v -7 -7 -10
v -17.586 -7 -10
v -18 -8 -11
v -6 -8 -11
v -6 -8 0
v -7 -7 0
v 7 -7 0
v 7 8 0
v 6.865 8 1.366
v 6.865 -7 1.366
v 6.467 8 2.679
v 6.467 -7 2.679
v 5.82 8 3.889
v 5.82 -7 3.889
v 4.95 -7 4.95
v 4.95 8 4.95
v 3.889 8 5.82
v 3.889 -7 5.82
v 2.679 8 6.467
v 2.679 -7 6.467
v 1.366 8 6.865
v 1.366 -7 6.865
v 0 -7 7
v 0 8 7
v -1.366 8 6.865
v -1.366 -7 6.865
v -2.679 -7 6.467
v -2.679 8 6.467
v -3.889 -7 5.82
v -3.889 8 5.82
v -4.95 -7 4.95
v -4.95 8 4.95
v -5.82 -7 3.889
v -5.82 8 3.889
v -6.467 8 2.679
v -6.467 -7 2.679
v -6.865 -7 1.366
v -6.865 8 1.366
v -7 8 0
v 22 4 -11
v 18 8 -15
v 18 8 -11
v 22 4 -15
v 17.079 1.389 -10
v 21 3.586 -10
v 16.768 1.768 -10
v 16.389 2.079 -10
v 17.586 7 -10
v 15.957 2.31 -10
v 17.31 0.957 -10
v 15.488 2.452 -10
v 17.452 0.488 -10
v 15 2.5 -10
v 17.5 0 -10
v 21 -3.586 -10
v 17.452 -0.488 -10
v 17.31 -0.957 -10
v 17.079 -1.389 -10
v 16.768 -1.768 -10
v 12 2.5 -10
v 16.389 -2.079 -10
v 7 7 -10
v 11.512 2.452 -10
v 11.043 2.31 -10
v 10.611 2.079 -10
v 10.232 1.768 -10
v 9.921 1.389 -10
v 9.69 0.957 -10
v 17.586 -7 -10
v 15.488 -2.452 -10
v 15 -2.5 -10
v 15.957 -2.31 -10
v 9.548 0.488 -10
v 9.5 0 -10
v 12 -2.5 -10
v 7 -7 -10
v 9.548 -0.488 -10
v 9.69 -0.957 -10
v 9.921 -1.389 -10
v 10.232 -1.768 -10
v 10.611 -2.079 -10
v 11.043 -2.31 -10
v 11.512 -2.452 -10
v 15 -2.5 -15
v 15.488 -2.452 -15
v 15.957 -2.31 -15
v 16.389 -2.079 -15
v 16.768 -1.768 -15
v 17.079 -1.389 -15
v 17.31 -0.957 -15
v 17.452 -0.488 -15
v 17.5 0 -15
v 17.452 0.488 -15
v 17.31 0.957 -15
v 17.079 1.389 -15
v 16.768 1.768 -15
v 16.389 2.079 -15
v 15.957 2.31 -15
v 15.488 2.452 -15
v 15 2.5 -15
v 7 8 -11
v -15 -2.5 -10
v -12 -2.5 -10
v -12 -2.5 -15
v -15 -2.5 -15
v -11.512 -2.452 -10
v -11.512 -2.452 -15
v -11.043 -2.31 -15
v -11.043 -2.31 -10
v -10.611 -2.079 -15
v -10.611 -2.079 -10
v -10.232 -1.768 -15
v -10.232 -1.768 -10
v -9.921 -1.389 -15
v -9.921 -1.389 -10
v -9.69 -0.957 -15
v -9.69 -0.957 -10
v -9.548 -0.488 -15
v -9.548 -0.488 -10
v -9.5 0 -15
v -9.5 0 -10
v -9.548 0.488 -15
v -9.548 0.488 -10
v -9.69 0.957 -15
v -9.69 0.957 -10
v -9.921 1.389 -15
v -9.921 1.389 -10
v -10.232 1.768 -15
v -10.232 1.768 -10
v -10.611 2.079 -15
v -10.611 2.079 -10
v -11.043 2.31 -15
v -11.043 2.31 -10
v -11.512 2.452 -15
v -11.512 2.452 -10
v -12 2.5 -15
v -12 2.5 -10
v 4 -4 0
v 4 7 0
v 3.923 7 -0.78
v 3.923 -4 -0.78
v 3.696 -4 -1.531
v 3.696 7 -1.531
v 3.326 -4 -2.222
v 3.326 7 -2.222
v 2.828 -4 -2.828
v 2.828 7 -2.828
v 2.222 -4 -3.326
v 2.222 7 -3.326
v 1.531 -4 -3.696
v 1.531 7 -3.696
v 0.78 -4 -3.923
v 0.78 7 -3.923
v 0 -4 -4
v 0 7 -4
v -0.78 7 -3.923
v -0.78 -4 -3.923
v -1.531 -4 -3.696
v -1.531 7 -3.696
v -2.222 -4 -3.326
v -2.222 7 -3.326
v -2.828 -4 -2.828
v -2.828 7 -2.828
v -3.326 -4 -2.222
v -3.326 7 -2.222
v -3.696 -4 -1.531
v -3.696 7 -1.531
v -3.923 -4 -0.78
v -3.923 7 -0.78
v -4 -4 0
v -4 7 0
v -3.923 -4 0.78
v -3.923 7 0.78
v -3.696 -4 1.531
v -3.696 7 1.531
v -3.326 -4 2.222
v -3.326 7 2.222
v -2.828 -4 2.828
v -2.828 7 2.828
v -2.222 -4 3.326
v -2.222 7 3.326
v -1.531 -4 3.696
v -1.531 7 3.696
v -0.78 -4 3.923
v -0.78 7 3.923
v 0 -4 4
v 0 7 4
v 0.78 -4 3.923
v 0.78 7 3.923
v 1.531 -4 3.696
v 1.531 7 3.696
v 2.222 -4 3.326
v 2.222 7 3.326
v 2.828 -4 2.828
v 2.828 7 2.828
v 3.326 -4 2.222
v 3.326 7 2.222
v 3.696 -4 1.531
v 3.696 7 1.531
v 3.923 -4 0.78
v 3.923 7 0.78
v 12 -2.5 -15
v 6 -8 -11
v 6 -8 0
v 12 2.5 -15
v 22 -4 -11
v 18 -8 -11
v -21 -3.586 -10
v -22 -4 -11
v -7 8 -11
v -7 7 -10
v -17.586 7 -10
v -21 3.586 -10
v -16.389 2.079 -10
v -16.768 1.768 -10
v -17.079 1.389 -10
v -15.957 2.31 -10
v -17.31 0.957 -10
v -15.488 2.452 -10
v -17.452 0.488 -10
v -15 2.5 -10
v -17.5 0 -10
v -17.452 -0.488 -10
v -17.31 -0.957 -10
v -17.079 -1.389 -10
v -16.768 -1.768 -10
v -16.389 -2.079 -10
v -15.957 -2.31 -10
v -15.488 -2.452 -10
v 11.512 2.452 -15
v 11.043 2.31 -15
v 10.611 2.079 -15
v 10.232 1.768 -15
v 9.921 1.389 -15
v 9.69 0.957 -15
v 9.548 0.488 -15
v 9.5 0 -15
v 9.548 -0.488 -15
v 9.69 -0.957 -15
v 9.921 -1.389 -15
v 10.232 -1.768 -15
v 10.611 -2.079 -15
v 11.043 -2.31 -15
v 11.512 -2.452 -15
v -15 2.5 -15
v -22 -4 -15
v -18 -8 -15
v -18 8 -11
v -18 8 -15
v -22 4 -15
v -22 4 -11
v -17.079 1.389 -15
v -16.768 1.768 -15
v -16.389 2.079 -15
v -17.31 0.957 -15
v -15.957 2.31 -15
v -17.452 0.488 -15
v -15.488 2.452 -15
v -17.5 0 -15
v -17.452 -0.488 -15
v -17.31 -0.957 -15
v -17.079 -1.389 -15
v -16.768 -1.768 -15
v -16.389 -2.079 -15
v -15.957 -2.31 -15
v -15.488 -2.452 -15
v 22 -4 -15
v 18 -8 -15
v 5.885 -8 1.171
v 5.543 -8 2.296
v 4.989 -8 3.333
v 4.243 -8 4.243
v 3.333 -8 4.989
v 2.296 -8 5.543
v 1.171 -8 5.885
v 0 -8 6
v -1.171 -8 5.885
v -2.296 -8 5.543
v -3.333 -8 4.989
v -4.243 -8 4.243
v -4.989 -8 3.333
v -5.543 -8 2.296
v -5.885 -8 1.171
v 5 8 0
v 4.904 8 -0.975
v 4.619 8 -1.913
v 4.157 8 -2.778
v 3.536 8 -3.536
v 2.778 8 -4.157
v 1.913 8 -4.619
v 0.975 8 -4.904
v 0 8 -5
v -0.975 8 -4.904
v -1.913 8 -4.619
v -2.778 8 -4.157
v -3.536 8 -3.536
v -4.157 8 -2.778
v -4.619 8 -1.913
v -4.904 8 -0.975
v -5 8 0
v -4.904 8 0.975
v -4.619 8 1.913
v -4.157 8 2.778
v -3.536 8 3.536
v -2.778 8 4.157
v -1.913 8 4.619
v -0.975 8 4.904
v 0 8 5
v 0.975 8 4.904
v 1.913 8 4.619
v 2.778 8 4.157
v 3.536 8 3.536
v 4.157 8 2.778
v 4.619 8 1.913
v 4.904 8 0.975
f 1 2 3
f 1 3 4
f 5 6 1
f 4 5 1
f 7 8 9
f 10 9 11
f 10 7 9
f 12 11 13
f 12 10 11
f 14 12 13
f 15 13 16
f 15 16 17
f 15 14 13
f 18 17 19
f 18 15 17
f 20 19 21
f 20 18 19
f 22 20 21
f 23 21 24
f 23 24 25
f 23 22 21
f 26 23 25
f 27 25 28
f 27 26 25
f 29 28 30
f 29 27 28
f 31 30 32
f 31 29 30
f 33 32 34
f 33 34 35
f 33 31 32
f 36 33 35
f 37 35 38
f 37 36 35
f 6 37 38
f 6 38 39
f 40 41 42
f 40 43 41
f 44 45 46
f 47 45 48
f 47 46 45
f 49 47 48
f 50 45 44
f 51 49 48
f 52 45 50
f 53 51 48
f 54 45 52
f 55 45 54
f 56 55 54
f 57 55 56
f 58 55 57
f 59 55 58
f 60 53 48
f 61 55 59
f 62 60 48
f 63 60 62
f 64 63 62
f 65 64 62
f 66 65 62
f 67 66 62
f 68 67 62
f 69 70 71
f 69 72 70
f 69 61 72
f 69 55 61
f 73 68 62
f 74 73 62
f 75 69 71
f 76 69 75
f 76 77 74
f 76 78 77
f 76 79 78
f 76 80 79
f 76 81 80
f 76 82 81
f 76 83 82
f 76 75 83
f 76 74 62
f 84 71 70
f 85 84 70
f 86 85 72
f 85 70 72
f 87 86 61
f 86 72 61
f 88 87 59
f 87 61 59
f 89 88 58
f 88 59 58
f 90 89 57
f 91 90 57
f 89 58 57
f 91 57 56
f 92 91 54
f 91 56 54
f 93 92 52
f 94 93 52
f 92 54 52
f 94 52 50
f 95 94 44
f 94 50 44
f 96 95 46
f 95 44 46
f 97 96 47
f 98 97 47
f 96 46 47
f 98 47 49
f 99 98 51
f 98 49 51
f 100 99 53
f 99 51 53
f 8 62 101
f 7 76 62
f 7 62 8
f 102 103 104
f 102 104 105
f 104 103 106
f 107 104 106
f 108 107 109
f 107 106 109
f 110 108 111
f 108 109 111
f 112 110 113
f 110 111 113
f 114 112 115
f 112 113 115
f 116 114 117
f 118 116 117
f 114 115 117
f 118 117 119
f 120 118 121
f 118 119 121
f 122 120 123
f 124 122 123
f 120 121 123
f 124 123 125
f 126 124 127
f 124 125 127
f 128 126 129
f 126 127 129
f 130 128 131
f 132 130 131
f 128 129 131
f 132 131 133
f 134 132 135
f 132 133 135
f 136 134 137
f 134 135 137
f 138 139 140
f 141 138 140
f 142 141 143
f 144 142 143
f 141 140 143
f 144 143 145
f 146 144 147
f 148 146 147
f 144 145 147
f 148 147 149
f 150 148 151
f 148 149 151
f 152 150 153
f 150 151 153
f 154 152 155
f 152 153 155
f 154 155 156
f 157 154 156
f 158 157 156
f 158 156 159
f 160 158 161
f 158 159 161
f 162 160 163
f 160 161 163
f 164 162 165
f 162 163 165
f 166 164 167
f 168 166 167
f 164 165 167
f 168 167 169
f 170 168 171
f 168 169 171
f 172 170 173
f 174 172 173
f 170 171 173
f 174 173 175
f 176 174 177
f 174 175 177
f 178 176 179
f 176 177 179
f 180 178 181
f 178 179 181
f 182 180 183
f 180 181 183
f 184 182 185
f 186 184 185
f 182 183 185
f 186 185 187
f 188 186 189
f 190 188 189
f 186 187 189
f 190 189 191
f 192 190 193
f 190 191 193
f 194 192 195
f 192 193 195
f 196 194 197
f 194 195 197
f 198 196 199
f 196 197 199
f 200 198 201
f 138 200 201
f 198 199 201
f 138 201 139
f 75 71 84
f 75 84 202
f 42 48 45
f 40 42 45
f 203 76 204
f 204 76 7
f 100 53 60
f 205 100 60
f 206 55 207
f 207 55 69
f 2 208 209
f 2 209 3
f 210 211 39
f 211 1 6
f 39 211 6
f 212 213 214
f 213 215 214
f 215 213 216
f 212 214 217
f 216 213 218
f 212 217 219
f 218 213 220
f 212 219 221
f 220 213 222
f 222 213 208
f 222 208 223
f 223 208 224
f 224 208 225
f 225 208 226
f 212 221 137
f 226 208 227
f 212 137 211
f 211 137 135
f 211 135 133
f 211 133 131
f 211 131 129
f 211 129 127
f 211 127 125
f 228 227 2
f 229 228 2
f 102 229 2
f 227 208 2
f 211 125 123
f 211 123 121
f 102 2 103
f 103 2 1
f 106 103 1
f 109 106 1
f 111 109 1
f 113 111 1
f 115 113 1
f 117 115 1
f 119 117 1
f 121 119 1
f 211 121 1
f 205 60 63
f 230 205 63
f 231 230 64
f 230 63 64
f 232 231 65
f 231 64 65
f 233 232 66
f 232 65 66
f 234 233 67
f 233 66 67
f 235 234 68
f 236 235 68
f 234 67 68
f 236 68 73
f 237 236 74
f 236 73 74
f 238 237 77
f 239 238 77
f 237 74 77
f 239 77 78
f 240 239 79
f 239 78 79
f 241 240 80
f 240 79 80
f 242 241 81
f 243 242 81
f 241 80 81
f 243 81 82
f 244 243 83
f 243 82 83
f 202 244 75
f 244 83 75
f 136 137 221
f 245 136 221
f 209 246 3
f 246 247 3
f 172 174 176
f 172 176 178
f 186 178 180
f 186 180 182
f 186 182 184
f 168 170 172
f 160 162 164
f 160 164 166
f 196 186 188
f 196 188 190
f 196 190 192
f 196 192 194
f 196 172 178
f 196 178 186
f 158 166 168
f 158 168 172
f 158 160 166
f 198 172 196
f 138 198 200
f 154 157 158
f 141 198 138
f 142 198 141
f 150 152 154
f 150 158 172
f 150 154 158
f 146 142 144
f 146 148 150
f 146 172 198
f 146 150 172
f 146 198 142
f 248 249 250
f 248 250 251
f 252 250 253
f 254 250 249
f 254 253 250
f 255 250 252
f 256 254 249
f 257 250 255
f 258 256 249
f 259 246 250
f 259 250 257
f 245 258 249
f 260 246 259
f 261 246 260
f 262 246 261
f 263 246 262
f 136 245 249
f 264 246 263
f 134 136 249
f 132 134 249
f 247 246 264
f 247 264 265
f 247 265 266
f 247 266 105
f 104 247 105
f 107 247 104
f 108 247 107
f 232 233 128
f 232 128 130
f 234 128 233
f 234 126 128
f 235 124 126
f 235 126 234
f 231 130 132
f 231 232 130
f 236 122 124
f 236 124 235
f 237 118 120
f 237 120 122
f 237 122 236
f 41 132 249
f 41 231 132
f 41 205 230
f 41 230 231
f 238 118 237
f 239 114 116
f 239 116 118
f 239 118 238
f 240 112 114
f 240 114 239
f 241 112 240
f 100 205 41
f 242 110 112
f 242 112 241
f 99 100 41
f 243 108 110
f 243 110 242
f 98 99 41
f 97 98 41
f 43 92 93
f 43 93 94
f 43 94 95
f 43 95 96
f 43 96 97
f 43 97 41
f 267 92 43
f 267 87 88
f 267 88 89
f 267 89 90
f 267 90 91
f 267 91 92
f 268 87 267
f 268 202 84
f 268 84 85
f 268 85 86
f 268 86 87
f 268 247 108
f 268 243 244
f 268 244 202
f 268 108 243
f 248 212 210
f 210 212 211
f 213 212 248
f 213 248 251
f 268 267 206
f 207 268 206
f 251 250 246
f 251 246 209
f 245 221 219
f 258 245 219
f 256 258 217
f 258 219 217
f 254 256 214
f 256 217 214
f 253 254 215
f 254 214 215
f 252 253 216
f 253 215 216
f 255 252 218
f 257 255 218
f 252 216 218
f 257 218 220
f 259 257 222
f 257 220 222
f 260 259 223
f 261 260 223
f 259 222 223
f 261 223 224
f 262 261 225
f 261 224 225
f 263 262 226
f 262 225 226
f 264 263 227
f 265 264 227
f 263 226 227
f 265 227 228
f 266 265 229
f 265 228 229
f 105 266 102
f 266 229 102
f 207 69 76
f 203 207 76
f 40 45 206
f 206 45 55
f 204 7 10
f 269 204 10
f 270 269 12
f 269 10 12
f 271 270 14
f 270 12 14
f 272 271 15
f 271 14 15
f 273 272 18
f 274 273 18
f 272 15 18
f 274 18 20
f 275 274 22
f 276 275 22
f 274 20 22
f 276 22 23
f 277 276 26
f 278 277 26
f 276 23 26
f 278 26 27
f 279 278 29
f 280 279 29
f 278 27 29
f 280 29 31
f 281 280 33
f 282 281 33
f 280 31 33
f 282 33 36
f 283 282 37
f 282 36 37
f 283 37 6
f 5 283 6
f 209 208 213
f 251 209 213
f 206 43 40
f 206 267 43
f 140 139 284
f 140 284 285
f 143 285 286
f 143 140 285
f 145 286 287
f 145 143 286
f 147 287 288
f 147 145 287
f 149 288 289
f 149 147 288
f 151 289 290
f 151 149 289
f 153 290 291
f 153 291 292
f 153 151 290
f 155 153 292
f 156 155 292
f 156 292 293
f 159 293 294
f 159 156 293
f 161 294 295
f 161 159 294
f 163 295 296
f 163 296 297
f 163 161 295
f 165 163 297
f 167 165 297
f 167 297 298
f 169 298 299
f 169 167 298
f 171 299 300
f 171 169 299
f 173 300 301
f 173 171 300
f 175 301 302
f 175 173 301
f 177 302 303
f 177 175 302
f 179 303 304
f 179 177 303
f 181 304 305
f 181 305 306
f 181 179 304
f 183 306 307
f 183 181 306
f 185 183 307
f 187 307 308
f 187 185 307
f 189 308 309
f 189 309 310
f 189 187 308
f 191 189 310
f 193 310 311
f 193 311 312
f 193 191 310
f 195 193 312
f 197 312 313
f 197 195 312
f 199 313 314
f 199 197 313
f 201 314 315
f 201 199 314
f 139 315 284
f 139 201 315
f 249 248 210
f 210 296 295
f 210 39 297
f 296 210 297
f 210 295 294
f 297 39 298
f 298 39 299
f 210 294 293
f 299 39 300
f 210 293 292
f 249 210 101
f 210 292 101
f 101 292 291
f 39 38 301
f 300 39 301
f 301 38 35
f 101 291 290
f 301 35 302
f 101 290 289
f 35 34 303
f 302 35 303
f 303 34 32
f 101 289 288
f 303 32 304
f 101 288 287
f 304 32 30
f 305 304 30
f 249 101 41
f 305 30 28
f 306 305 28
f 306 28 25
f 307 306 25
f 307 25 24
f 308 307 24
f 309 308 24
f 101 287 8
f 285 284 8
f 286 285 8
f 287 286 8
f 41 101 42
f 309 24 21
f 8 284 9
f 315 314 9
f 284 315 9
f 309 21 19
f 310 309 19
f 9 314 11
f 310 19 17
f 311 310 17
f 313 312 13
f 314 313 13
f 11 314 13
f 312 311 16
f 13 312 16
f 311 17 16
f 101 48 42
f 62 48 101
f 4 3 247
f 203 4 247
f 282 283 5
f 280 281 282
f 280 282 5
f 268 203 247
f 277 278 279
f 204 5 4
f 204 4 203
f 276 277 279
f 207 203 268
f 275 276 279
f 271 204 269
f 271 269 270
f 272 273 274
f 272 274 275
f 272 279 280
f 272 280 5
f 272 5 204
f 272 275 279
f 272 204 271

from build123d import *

# Parameters (mm, degrees)
PAD_DEPTH       = 8
POCKET_DEPTH    = 5.001
SKETCH002_R     = 4
POCKET001_DEPTH = 12
CHAMFER_SIZE    = 4
CHAMFER001_SIZE = 1
CHAMFER002_SIZE = 1


with BuildPart() as part:
    # Sketch → Pad (new body, symmetric)
    with BuildSketch(Plane.XZ):
        with BuildLine():
            Line((-22, -15), (22, -15))
            Line((22, -15), (22, -10))
            Line((22, -10), (7, -10))
            Line((7, -10), (7, 0))
            ThreePointArc((7, 0), (0, 7), (-7, 0))
            Line((-7, -10), (-7, 0))
            Line((-22, -10), (-7, -10))
            Line((-22, -15), (-22, -10))
        make_face()
    extrude(amount=PAD_DEPTH, both=True)

    # Sketch001 (on Face7 of Pad) → Pocket (cut, through all)
    with BuildSketch(Plane(origin=(0, 0, -10), x_dir=(-1, 0, 0), z_dir=(0, 0, 1))):
        with BuildLine():
            ThreePointArc((-15, 2.5), (-17.5, 0), (-15, -2.5))
            Line((-15, -2.5), (-12, -2.5))
            ThreePointArc((-12, -2.5), (-9.5, 0), (-12, 2.5))
            Line((-15, 2.5), (-12, 2.5))
        make_face()
        with BuildLine():
            ThreePointArc((12, 2.5), (9.5, 0), (12, -2.5))
            Line((12, -2.5), (15, -2.5))
            ThreePointArc((15, -2.5), (17.5, 0), (15, 2.5))
            Line((12, 2.5), (15, 2.5))
        make_face()
    extrude(amount=-POCKET_DEPTH, mode=Mode.SUBTRACT)

    # Sketch002 (on Face3 of Pocket) → Pocket001 (cut)
    with BuildSketch(Plane(origin=(0, 8, 0), x_dir=(1, 0, 0), z_dir=(0, 1, 0))):
        Circle(SKETCH002_R)
    extrude(amount=-POCKET001_DEPTH, mode=Mode.SUBTRACT)

    # Chamfer
    chamfer_edges = [part.edges().sort_by_distance(p)[0] for p in [
        (22, 8, -12.5),
        (-22, 8, -12.5),
        (-22, -8, -12.5),
        (22, -8, -12.5),
    ]]
    chamfer(chamfer_edges, length=CHAMFER_SIZE)

    # Chamfer001
    chamfer001_edges = [part.edges().sort_by_distance(p)[0] for p in [
        (-12.5, 8, -10),
        (-20, 6, -10),
        (-22, 0, -10),
        (-12.5, -8, -10),
        (12.5, -8, -10),
        (20, -6, -10),
        (22, 0, -10),
        (20, 6, -10),
        (12.5, 8, -10),
        (-20, -6, -10),
        (0, -8, 7),
    ]]
    chamfer(chamfer001_edges, length=CHAMFER001_SIZE)

    # Chamfer002
    chamfer002_edges = [part.edges().sort_by_distance(p)[0] for p in [
        (-4, 8, 0),
    ]]
    chamfer(chamfer002_edges, length=CHAMFER002_SIZE)


solid = part.part
